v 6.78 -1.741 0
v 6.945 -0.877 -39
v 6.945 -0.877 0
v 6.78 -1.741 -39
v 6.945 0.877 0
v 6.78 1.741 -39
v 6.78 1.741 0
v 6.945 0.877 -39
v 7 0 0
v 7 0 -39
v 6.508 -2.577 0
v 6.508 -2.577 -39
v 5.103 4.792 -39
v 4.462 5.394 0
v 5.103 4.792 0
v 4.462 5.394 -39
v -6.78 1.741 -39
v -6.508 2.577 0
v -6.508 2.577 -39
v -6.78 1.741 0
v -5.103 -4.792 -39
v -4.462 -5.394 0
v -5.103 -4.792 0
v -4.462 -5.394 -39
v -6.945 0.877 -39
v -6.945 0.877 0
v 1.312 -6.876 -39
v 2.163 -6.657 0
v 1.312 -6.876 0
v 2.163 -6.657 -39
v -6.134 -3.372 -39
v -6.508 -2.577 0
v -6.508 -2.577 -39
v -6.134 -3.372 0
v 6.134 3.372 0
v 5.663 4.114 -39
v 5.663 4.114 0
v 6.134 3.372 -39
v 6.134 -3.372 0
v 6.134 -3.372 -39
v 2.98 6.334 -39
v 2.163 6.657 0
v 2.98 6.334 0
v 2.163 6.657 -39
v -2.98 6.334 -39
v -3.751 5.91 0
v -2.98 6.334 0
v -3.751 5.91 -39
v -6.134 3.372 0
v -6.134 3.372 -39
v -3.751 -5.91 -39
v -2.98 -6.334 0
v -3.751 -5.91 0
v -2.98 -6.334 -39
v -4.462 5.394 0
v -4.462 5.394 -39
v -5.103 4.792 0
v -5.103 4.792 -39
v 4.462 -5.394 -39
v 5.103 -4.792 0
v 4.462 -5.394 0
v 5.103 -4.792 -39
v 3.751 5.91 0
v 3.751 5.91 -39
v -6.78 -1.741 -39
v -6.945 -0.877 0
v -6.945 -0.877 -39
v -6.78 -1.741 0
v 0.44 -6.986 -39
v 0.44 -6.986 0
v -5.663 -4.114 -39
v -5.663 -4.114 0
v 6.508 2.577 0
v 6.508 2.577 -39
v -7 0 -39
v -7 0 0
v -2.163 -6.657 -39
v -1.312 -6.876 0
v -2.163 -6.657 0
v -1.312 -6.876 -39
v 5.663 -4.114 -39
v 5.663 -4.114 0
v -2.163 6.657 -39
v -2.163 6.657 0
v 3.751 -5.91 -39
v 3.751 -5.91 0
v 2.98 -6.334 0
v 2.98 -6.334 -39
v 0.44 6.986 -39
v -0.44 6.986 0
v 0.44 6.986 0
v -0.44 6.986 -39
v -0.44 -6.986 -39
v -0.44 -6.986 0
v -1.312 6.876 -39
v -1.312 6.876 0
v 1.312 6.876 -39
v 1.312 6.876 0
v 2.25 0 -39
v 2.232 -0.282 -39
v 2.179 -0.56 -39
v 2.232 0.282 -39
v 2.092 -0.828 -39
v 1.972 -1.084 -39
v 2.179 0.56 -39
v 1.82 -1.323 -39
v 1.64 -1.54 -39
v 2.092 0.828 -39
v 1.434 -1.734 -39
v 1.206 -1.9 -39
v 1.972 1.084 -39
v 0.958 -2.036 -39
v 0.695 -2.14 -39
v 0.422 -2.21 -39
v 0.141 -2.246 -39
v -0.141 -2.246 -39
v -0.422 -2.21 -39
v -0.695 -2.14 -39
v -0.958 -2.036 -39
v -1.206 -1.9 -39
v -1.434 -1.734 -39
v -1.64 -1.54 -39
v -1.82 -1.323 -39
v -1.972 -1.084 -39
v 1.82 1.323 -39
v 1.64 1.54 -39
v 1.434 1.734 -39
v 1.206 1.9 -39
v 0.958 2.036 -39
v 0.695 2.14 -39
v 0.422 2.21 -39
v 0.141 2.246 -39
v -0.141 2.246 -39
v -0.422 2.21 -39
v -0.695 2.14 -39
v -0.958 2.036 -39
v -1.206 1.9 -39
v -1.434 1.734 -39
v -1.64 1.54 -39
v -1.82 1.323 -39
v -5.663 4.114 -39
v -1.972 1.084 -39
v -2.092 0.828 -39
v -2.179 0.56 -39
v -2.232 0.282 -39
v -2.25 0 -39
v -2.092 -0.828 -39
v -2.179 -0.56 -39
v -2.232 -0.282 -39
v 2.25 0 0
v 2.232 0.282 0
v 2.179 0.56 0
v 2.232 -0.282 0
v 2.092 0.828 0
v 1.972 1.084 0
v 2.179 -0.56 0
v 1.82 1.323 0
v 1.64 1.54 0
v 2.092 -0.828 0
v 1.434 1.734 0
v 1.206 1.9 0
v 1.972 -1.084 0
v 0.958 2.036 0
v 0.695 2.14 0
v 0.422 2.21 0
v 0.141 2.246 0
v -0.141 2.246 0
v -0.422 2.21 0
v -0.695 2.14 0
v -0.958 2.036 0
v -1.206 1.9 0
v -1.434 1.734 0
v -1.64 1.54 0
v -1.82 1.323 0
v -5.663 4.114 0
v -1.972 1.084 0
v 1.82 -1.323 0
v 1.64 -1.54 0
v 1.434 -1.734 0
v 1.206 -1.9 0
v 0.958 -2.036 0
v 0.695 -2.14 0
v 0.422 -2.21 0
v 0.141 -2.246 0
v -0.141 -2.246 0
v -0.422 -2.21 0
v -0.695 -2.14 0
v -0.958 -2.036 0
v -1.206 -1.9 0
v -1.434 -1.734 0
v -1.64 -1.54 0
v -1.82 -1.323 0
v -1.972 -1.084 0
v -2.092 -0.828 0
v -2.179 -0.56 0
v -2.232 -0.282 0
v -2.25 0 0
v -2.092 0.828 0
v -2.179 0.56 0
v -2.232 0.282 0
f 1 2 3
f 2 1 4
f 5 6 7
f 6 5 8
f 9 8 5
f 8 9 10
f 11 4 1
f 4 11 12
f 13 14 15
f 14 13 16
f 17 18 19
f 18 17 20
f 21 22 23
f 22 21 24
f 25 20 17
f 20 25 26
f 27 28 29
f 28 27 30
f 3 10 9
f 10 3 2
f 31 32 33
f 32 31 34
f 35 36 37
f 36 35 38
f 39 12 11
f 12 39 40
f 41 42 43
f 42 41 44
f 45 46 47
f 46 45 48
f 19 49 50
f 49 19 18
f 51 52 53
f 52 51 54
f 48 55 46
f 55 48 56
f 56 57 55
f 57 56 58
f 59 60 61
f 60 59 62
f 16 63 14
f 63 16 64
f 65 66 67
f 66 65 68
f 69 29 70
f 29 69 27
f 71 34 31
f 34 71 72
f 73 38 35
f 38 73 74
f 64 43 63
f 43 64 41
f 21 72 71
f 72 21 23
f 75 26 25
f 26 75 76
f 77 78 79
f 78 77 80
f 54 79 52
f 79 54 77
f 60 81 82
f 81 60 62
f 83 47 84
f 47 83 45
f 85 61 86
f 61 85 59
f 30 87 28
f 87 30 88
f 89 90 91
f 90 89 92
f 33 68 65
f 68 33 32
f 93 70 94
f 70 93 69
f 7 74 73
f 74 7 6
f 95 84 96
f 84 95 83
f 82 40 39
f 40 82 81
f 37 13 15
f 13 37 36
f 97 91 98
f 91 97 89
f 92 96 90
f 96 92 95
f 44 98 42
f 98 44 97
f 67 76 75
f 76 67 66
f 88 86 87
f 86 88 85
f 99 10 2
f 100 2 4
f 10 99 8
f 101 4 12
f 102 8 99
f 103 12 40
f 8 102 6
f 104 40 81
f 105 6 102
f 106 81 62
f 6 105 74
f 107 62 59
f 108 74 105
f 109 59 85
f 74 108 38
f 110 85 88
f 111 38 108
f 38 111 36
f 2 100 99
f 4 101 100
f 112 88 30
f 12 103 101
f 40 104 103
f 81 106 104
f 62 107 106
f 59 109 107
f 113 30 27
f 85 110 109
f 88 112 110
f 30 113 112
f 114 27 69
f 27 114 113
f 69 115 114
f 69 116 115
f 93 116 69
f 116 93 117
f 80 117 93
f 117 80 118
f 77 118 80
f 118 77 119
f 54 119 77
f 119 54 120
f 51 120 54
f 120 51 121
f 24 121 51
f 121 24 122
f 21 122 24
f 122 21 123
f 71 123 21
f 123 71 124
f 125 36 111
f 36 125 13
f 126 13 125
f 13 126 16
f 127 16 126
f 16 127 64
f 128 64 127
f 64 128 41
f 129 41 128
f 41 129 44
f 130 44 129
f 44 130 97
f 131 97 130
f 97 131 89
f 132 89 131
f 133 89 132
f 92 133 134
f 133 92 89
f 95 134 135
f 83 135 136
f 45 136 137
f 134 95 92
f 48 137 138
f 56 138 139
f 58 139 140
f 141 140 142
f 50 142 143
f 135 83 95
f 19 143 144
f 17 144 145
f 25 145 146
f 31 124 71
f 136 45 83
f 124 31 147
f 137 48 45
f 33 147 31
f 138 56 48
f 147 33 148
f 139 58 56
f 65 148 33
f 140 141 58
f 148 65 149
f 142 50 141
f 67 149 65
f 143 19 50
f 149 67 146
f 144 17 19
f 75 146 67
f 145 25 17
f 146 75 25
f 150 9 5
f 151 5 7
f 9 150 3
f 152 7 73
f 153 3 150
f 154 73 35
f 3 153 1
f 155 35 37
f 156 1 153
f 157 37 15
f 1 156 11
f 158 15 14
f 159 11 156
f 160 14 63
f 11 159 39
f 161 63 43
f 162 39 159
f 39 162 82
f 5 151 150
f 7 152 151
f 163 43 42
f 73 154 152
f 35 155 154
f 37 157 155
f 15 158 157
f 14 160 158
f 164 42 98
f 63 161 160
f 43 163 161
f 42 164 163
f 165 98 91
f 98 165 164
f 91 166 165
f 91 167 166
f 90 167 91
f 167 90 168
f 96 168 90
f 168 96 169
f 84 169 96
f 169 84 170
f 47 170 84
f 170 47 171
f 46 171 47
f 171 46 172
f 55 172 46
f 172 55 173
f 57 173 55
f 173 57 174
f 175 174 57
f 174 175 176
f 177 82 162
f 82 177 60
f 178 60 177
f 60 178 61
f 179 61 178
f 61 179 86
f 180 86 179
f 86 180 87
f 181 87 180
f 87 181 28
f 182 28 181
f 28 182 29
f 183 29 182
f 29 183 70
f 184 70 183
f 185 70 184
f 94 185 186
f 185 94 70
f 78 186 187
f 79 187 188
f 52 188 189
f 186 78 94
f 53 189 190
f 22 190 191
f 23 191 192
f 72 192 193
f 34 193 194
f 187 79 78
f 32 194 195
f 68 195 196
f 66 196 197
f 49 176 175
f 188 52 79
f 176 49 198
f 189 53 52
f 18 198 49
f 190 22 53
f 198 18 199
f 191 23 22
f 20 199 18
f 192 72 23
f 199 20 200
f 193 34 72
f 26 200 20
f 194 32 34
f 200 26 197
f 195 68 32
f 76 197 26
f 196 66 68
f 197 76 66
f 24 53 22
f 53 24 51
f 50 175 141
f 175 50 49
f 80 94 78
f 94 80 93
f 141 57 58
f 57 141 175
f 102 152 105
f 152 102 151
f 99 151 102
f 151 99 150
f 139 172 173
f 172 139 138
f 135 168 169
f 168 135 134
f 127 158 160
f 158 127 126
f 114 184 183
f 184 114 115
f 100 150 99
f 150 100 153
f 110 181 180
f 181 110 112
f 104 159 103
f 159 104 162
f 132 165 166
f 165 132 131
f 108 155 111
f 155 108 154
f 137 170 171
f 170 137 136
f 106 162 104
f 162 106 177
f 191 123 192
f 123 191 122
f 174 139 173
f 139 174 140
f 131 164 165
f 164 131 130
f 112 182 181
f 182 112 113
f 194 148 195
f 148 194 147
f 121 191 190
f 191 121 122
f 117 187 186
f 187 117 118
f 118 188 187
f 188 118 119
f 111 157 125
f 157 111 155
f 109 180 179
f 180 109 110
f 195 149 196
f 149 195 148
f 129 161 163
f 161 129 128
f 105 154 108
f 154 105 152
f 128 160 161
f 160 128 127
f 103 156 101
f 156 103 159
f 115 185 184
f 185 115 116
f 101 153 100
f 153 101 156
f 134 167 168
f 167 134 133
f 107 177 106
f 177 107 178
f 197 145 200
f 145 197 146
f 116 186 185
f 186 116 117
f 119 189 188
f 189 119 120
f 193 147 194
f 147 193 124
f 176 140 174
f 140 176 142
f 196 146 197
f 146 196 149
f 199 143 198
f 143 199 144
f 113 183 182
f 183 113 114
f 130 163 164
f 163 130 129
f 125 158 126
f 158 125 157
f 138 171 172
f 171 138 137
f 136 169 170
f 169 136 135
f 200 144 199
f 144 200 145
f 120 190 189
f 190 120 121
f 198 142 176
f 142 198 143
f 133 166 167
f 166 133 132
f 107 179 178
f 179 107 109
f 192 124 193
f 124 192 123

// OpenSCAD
$fn = 50;


difference() {
	union() {
		translate(v = [0, 0, -39.0000000000]) {
			cylinder(h = 39, r = 7.0000000000);
		}
		cylinder(h = 0, r = 16.0000000000);
	}
	union() {
		#translate(v = [0, 0, -39]) {
			cylinder(h = 39, r = 2.2500000000);
		}
	}
}
